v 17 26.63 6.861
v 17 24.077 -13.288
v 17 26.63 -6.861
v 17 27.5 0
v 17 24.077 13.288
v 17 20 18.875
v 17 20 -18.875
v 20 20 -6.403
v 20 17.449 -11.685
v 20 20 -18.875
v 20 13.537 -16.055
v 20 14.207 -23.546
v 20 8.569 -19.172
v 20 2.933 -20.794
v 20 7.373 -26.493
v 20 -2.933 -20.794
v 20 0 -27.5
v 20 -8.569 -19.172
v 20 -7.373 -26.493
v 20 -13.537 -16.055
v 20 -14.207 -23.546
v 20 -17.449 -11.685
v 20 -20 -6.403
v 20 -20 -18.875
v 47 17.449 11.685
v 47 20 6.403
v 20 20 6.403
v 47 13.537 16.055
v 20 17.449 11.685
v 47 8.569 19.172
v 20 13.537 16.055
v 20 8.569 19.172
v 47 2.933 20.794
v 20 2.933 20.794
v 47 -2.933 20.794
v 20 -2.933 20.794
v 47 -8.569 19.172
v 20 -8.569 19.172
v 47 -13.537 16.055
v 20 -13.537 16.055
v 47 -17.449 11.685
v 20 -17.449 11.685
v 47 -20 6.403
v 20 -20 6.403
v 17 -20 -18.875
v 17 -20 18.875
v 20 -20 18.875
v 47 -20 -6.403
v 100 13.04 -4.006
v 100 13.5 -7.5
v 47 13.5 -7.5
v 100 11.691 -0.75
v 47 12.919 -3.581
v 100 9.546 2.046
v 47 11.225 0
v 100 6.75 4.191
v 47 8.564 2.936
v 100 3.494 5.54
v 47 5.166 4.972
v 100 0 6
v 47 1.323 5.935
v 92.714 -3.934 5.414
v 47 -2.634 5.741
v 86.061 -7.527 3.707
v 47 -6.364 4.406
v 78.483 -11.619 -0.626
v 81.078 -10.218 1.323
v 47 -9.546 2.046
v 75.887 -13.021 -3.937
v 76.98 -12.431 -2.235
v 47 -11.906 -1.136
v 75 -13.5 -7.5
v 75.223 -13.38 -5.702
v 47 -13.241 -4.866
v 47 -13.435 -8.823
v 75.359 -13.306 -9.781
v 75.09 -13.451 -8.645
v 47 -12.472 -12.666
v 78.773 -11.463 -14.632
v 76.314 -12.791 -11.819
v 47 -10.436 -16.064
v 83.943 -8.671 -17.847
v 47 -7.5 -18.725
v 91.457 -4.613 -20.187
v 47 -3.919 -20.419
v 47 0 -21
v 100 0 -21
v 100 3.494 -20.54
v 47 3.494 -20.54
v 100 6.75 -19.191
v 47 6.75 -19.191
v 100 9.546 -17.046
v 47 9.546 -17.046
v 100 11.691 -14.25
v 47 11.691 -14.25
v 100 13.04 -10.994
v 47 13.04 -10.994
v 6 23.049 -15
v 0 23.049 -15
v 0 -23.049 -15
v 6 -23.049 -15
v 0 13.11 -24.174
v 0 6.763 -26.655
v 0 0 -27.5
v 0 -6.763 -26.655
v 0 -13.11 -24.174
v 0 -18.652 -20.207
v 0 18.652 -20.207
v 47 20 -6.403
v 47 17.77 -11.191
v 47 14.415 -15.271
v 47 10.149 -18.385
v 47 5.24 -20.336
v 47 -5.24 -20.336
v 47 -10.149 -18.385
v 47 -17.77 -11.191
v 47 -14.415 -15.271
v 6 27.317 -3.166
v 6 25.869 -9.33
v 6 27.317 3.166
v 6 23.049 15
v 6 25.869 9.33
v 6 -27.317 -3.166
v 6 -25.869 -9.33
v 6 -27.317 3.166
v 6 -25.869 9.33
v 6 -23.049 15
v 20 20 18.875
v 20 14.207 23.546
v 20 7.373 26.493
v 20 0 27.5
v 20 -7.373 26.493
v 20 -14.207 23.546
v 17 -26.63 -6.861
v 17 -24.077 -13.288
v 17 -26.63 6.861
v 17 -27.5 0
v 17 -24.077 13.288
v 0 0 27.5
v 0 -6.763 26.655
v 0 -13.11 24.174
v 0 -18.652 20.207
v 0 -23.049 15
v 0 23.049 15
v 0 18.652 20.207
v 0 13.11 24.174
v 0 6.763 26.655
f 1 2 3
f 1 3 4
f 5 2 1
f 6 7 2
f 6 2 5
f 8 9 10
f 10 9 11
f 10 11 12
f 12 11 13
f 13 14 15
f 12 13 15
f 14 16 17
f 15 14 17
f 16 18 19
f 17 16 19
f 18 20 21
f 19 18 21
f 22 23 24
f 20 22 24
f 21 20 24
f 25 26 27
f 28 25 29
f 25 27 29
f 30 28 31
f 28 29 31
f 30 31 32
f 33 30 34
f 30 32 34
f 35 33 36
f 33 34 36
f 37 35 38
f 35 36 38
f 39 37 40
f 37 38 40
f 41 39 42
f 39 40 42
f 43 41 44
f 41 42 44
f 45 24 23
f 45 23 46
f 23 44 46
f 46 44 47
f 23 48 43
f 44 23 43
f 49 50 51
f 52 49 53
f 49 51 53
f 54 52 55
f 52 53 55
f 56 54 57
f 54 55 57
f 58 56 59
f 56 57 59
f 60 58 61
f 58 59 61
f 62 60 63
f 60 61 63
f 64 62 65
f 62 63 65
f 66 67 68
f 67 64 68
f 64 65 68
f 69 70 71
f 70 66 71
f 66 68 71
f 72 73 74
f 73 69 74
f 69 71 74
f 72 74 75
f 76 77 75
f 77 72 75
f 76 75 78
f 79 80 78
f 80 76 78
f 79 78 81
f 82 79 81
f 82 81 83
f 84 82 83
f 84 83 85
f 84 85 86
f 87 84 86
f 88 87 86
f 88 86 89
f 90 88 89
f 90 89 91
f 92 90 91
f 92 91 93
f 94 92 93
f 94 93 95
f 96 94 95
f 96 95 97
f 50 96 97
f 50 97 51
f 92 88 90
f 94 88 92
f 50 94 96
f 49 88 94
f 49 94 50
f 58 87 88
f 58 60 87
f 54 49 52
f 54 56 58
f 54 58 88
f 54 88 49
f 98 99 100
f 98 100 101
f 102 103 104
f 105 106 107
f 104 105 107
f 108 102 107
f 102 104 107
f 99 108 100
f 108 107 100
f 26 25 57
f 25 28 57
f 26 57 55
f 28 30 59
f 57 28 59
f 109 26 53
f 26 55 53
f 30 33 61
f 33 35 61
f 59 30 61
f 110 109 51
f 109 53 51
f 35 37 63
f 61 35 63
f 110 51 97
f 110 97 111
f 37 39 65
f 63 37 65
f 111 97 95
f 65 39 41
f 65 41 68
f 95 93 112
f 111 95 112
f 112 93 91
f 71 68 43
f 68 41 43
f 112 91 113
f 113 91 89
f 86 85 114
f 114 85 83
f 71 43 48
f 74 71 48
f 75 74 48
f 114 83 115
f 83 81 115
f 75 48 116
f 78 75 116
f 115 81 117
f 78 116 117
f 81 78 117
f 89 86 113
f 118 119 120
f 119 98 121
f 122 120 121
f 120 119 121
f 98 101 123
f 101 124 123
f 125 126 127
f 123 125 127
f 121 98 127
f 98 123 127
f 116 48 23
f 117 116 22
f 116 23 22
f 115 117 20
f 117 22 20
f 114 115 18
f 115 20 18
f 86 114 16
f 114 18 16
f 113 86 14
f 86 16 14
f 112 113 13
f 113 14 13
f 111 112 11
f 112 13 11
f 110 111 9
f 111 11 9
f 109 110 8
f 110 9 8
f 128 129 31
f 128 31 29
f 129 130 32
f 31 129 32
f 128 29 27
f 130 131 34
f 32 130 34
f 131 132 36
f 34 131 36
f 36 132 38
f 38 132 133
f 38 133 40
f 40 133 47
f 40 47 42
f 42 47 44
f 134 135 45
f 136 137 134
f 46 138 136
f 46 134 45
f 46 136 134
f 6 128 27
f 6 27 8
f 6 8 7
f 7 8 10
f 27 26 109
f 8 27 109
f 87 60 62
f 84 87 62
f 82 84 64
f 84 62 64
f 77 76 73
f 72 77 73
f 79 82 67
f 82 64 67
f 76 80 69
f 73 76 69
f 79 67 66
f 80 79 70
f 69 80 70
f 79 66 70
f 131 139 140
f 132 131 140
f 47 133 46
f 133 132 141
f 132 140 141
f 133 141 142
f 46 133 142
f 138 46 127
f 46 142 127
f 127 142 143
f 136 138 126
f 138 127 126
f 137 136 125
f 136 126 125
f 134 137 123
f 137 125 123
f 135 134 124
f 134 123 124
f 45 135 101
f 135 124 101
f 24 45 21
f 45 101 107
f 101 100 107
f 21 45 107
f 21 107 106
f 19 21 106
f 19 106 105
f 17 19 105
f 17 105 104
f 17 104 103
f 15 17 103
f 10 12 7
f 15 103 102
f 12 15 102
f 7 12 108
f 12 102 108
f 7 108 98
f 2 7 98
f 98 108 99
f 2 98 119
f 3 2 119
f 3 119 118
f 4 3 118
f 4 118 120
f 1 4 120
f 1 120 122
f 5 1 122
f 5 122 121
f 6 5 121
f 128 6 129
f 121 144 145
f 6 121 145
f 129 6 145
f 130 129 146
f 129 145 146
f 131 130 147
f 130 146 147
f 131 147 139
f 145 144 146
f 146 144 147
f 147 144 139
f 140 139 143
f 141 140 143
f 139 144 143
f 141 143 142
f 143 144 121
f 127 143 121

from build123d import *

# Parameters (mm, degrees)
F2_R     = 13.5
F3_DEPTH = 53
F5_DEPTH = 30
F6_W     = 6
F6_H     = 30
F7_DEPTH = 27.5
F9_DEPTH = 25


# Not quite as in the source:
# - a feature names something its author has since deleted; it is built from what else it names


with BuildPart() as f1:
    # F0 (on Front) → F1 (revolve)
    with BuildSketch(Plane.XZ):
        Polygon((0, 27.5), (0, 0), (47, 0), (47, 21), (20, 21), (20, 27.5), align=None)
    revolve(axis=Axis((37.6517102122, 0, 0), (1, 0, 0)))

    # F2 (on face) → F3 (join)
    with BuildSketch(Plane.YZ.offset(47)):
        with Locations((0, -7.5)):
            Circle(F2_R)
    extrude(amount=F3_DEPTH)

    # F4 (on face) → F5 (cut)
    with BuildSketch(Plane.YZ.offset(47)):
        with BuildLine():
            ThreePointArc((20, -18.8745860882), (25.5563103753, -10.1550480058), (27.5, 0))
            ThreePointArc((27.5, 0), (25.5563103753, 10.1550480058), (20, 18.8745860882))
            Line((20, 18.8745860882), (20, 6.4031242374))
            ThreePointArc((20, 6.4031242374), (21, 0), (20, -6.4031242374))
            Line((20, -6.4031242374), (20, -18.8745860882))
        make_face()
        with BuildLine():
            Line((-20, 6.4031242374), (-20, 18.8745860882))
            ThreePointArc((-20, 18.8745860882), (-27.5, 0), (-20, -18.8745860882))
            Line((-20, -18.8745860882), (-20, -6.4031242374))
            ThreePointArc((-20, -6.4031242374), (-21, 0), (-20, 6.4031242374))
        make_face()
        with BuildLine():
            ThreePointArc((20, -6.4031242374), (21, 0), (20, 6.4031242374))
            Line((20, 6.4031242374), (20, -6.4031242374))
        make_face()
        with BuildLine():
            Line((-20, -6.4031242374), (-20, 6.4031242374))
            ThreePointArc((-20, 6.4031242374), (-21, 0), (-20, -6.4031242374))
        make_face()
    extrude(amount=-F5_DEPTH, mode=Mode.SUBTRACT)

    # F6 (on Front) → F7 (cut, symmetric)
    with BuildSketch(Plane.XZ):
        with Locations((3, 0)):
            Rectangle(F6_W, F6_H)
    extrude(amount=F7_DEPTH, both=True, mode=Mode.SUBTRACT)

    # F8 (on Top) → F9 (cut, symmetric)
    with BuildSketch(Plane.XY):
        Polygon((100, -13.5), (100, 0), (75, -13.5), align=None)
    extrude(amount=F9_DEPTH, both=True, mode=Mode.SUBTRACT)


solid = f1.part
